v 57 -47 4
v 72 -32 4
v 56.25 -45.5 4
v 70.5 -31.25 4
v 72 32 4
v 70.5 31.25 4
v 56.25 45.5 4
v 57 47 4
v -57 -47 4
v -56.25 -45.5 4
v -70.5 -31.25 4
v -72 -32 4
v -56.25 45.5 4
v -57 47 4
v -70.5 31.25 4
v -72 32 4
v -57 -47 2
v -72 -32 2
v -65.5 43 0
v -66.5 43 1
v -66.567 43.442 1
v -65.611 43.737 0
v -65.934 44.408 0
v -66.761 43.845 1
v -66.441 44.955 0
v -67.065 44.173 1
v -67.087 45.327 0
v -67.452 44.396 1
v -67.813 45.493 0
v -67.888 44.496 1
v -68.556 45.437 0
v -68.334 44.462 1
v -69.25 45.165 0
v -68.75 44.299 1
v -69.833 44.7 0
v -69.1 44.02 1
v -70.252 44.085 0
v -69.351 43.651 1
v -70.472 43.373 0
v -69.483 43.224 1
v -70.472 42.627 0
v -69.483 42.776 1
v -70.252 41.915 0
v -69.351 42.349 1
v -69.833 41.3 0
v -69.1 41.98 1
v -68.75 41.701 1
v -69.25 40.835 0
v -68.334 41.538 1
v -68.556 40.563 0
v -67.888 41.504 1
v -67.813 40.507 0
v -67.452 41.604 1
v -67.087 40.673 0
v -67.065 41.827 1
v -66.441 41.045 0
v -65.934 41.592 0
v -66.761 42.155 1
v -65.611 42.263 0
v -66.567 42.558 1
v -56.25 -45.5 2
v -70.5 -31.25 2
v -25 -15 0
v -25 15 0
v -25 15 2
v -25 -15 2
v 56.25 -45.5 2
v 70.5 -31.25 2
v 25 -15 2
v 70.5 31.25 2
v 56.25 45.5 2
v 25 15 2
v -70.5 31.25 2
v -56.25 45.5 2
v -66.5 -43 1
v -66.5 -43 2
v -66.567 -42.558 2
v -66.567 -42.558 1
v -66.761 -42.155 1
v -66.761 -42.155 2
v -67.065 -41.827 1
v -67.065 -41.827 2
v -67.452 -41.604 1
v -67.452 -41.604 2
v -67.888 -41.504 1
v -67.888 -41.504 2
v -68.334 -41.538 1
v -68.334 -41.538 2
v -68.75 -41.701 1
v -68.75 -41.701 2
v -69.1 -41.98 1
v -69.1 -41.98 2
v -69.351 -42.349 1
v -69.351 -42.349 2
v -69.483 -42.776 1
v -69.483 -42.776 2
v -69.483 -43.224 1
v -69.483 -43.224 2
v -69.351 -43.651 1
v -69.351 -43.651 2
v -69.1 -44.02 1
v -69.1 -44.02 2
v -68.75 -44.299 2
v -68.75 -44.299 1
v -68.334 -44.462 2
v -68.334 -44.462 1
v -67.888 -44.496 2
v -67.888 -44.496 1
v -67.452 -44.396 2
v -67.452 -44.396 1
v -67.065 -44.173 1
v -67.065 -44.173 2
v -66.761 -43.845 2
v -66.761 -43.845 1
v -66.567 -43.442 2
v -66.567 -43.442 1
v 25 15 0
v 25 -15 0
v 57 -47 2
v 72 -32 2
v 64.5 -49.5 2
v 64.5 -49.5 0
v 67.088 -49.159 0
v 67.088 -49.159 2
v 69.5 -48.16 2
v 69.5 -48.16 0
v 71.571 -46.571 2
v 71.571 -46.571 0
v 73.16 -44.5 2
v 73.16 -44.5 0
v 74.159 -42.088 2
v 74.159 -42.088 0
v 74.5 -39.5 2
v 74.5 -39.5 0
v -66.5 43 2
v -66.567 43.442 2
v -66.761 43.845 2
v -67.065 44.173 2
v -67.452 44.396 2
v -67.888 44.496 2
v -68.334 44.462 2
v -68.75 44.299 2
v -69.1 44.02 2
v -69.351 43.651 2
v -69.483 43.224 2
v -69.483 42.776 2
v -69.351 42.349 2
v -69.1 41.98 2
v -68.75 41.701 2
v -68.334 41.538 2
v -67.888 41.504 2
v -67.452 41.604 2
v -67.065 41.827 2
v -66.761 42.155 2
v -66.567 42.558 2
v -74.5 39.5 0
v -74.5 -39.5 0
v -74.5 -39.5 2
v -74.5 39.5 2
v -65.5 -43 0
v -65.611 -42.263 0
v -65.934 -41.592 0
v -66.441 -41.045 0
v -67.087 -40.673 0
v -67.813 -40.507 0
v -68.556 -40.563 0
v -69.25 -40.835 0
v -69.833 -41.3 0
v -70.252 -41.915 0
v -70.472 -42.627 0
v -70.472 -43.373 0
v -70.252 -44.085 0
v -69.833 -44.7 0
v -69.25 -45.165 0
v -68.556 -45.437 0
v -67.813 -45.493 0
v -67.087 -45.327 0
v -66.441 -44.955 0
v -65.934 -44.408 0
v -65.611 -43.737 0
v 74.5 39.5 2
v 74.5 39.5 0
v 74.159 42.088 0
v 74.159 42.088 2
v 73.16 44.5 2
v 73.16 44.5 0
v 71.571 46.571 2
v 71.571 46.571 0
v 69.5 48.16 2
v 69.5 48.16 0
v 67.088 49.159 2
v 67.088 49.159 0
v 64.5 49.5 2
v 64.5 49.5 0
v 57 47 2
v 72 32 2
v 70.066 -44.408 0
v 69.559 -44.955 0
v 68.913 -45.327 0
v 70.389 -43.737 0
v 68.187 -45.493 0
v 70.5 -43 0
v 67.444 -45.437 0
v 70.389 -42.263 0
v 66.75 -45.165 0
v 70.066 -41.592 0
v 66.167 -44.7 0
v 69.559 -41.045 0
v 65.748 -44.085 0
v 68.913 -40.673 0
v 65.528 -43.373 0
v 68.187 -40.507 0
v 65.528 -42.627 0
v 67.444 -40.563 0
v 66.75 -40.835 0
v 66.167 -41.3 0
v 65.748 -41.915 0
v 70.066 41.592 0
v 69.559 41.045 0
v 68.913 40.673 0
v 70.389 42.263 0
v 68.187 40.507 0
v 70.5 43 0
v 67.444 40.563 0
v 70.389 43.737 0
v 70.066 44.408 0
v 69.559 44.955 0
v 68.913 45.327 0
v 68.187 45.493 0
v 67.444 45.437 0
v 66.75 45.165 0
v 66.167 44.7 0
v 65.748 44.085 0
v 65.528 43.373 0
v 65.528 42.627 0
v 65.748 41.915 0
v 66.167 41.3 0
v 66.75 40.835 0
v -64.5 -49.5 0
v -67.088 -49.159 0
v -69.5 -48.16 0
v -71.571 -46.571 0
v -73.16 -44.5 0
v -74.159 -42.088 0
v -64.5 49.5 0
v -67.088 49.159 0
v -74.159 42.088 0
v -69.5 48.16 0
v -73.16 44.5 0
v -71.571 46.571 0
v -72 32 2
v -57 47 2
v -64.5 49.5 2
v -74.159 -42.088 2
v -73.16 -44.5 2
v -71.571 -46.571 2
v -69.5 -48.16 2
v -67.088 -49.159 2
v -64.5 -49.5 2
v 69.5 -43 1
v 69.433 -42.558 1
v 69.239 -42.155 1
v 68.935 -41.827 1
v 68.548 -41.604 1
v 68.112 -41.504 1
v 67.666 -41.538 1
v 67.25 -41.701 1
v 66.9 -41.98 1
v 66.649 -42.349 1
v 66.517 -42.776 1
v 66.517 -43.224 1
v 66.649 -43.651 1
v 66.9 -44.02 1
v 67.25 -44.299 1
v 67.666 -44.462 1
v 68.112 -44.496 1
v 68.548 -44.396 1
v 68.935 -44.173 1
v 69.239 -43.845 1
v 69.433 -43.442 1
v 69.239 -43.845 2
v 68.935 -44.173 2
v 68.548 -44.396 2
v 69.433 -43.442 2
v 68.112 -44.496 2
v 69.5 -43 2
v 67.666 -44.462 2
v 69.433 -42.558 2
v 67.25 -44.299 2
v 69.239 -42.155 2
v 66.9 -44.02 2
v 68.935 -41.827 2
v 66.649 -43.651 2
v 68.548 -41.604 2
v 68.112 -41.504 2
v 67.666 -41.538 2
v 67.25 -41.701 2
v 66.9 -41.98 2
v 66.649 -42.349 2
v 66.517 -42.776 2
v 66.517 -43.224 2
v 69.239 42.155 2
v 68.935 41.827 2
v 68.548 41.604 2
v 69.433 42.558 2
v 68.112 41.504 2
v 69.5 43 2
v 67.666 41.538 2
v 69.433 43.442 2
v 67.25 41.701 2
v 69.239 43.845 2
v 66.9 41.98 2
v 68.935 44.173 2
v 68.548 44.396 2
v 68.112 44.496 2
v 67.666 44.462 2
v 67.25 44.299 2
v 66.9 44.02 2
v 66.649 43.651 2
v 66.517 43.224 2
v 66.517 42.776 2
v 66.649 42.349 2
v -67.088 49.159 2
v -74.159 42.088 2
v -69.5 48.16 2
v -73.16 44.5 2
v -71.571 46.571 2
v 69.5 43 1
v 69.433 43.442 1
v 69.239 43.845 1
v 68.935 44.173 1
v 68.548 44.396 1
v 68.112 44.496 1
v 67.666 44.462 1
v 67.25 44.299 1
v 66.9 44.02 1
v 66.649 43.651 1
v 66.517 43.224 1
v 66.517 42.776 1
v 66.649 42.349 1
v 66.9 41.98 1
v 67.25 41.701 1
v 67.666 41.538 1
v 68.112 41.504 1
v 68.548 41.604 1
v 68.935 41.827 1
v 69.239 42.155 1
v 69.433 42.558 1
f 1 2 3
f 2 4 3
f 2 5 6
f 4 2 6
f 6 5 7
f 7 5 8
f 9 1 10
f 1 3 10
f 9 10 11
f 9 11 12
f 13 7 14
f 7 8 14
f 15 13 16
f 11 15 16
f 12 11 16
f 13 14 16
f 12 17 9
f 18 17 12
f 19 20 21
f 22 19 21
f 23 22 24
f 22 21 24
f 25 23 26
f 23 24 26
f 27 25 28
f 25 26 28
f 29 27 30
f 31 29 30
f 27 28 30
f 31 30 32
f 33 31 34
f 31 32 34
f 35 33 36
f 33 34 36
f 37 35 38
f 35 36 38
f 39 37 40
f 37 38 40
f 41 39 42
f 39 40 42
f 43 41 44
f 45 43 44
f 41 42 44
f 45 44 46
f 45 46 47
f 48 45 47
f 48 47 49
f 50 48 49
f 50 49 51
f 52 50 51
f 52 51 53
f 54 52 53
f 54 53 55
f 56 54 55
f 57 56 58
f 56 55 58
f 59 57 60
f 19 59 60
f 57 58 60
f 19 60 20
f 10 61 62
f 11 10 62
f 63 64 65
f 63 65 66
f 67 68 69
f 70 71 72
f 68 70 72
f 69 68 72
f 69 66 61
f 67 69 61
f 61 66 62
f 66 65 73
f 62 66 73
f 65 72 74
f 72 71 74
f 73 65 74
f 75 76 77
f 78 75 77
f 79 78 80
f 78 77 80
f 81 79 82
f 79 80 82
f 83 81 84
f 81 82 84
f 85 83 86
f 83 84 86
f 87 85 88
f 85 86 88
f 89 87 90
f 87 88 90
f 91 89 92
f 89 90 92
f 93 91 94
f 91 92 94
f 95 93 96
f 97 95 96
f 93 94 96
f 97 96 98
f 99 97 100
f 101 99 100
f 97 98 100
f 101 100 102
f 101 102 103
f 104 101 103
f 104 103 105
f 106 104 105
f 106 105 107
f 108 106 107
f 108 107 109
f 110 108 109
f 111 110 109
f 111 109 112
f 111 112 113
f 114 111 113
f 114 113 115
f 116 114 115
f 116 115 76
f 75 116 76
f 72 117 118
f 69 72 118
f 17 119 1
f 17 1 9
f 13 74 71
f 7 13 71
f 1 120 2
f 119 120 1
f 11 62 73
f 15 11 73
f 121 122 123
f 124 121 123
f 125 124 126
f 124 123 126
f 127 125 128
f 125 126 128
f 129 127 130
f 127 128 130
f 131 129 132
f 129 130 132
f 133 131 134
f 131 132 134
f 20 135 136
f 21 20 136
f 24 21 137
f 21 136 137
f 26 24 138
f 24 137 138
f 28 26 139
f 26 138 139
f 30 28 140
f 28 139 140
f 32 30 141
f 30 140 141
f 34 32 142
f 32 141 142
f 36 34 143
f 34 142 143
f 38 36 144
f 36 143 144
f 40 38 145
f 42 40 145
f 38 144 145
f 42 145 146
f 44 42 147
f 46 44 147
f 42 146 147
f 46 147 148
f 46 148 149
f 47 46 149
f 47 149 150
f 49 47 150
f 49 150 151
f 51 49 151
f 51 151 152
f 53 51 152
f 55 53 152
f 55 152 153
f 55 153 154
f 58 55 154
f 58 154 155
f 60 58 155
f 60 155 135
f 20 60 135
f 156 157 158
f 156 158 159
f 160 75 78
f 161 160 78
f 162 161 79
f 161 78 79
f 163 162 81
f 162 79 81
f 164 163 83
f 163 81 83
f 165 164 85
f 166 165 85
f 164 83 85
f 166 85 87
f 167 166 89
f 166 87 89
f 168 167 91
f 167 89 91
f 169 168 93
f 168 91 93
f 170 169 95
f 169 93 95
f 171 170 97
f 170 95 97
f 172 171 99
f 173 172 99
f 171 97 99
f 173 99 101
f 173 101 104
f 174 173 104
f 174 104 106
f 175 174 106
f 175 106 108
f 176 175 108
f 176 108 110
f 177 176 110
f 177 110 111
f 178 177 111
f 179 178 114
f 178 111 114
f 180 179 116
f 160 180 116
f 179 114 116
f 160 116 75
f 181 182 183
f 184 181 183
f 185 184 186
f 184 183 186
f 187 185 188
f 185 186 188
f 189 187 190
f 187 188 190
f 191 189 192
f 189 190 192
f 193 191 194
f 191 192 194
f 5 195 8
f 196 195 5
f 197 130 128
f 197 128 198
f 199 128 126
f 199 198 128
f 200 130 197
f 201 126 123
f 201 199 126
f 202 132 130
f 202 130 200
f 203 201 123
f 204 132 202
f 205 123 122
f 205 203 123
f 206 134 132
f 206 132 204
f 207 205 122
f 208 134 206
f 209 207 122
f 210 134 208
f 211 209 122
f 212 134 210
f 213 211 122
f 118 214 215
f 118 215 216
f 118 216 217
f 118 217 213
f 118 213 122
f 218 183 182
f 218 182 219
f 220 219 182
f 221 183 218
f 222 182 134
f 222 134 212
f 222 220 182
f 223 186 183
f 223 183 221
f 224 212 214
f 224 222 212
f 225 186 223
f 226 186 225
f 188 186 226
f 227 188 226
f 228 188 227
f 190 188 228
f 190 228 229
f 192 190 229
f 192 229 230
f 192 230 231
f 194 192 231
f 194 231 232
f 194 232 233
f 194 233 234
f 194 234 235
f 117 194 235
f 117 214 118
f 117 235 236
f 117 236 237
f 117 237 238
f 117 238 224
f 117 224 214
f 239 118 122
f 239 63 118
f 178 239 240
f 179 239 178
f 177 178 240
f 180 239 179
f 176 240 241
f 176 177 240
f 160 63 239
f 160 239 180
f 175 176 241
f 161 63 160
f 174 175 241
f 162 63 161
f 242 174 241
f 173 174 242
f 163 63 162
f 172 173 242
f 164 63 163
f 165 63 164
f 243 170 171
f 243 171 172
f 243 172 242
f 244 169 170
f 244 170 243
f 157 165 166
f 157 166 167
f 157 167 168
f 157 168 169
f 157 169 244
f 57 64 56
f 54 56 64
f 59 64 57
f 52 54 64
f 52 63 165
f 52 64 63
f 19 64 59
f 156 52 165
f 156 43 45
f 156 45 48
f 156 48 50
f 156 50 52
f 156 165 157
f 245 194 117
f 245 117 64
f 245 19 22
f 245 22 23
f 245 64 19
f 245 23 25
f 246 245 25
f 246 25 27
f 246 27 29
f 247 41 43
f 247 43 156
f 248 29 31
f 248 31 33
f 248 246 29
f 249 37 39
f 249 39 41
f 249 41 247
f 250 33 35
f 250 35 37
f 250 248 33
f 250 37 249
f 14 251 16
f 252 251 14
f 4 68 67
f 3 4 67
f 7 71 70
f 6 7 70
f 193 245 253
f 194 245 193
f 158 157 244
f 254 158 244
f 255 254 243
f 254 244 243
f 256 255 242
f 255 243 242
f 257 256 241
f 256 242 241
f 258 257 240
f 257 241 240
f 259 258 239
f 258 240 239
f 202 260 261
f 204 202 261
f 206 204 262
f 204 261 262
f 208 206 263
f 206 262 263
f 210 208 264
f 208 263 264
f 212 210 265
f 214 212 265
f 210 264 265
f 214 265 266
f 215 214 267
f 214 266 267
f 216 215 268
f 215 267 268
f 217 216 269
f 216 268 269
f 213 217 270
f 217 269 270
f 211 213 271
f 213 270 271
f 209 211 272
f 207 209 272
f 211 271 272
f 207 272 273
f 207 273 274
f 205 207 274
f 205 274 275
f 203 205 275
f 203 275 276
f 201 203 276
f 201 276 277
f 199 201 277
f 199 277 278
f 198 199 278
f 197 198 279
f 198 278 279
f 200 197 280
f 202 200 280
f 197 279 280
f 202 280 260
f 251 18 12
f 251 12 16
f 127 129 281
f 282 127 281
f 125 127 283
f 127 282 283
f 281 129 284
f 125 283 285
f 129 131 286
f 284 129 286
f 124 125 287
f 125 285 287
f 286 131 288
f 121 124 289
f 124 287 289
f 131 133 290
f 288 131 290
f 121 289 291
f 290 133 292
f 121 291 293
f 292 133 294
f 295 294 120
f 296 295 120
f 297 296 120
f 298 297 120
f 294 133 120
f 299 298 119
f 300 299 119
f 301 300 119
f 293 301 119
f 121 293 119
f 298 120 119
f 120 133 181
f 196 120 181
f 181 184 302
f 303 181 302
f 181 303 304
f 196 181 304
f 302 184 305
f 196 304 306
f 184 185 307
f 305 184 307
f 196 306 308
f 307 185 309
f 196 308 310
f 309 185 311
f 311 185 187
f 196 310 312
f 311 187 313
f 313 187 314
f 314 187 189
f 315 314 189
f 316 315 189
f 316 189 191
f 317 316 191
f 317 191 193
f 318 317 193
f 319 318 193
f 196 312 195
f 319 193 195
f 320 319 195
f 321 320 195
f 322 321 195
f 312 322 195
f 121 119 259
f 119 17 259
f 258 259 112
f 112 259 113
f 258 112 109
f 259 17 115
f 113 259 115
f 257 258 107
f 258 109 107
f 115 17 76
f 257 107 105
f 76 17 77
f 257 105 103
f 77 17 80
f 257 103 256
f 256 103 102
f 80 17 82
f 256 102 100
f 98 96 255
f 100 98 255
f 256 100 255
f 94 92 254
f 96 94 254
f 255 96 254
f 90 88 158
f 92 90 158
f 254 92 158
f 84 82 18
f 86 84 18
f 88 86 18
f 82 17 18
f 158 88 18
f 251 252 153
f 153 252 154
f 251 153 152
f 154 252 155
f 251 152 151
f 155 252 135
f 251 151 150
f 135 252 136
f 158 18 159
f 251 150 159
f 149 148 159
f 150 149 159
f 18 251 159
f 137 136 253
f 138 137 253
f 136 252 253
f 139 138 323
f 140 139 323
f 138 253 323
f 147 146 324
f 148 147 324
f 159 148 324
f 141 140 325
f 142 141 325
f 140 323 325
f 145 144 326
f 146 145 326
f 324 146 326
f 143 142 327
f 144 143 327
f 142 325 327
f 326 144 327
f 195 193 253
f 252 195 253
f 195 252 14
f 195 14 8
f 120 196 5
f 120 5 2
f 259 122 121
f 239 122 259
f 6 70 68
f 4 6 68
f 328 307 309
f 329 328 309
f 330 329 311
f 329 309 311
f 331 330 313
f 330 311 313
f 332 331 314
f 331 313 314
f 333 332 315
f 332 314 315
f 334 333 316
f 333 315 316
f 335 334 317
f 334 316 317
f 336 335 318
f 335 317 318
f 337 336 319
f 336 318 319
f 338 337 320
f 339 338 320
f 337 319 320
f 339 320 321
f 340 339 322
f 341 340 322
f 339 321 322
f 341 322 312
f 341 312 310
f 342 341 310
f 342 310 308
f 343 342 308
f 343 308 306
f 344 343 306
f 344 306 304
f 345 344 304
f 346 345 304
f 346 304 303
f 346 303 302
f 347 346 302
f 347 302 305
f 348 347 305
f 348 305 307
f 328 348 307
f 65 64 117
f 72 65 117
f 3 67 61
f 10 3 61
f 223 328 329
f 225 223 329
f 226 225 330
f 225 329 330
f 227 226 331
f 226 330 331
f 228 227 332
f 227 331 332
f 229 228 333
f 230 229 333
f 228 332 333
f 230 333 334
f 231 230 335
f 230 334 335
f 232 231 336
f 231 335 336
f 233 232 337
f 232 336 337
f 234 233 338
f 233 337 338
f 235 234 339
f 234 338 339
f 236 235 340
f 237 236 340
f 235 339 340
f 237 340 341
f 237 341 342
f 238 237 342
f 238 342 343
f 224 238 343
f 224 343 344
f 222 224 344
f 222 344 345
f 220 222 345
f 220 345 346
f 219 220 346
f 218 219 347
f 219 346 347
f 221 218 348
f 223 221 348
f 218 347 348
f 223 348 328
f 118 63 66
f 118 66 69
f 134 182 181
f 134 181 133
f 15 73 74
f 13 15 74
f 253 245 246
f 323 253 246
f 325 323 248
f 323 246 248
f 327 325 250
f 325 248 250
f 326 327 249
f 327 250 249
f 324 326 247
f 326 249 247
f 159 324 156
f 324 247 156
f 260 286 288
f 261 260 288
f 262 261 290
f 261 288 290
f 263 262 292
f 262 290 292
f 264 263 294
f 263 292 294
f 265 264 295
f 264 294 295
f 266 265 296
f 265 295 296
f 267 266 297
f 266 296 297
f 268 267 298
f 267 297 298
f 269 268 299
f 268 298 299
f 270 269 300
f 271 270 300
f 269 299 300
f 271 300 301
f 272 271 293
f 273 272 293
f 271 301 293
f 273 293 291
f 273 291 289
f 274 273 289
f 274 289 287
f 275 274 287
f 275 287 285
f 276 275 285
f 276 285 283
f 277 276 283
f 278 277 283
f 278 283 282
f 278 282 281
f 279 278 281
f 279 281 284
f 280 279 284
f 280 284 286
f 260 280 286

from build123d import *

# Parameters (mm, degrees)
PAD_DEPTH       = 2
SKETCH002_R     = 1.5
POCKET_DEPTH    = 5
CHAMFER_SIZE    = 1
CHAMFER001_SIZE = 1
CHAMFER002_SIZE = 1
CHAMFER003_SIZE = 1
SKETCH004_W     = 50
SKETCH004_H     = 30
POCKET001_DEPTH = 5
PAD001_DEPTH    = 2


with BuildPart() as part:
    # Sketch → Pad (new body)
    with BuildSketch(Plane.XY):
        with BuildLine():
            Line((-64.5, 49.5), (64.5, 49.5))
            ThreePointArc((74.5, 39.5), (71.571068, 46.571068), (64.5, 49.5))
            Line((74.5, 39.5), (74.5, -39.5))
            ThreePointArc((64.5, -49.5), (71.571068, -46.571068), (74.5, -39.5))
            Line((64.5, -49.5), (-64.5, -49.5))
            ThreePointArc((-74.5, -39.5), (-71.571068, -46.571068), (-64.5, -49.5))
            Line((-74.5, -39.5), (-74.5, 39.5))
            ThreePointArc((-64.5, 49.5), (-71.571068, 46.571068), (-74.5, 39.5))
        make_face()
    extrude(amount=PAD_DEPTH)

    # Sketch002 → Pocket (cut)
    with BuildSketch(Plane.XY.offset(4)):
        with Locations((-68, 43)):
            Circle(SKETCH002_R)
        with Locations((-68, -43)):
            Circle(SKETCH002_R)
        with Locations((68, -43)):
            Circle(SKETCH002_R)
        with Locations((68, 43)):
            Circle(SKETCH002_R)
    extrude(amount=-POCKET_DEPTH, mode=Mode.SUBTRACT)

    # Chamfer
    chamfer_edges = [part.edges().sort_by_distance(p)[0] for p in [
        (-69.5, 43, 0),
    ]]
    chamfer(chamfer_edges, length=CHAMFER_SIZE)

    # Chamfer001
    chamfer001_edges = [part.edges().sort_by_distance(p)[0] for p in [
        (-69.5, -43, 0),
    ]]
    chamfer(chamfer001_edges, length=CHAMFER001_SIZE)

    # Chamfer002
    chamfer002_edges = [part.edges().sort_by_distance(p)[0] for p in [
        (66.5, -43, 0),
    ]]
    chamfer(chamfer002_edges, length=CHAMFER002_SIZE)

    # Chamfer003
    chamfer003_edges = [part.edges().sort_by_distance(p)[0] for p in [
        (66.5, 43, 0),
    ]]
    chamfer(chamfer003_edges, length=CHAMFER003_SIZE)

    # Sketch004 → Pocket001 (cut)
    with BuildSketch(Plane(origin=(0, 0, 0), x_dir=(1, 0, 0), z_dir=(0, 0, -1))):
        Rectangle(SKETCH004_W, SKETCH004_H)
    extrude(amount=-POCKET001_DEPTH, mode=Mode.SUBTRACT)

    # Sketch005 (on Face18 of Pocket001) → Pad001 (join)
    with BuildSketch(Plane.XY.offset(2)):
        Polygon((-57, 47), (57, 47), (72, 32), (72, -32), (57, -47), (-57, -47), (-72, -32), (-72, 32), align=None)
        Polygon((-70.5, 31.25), (-56.25, 45.5), (56.25, 45.5), (70.5, 31.25), (70.5, -31.25), (56.25, -45.5), (-56.25, -45.5), (-70.5, -31.25), align=None, mode=Mode.SUBTRACT)
    extrude(amount=PAD001_DEPTH)


solid = part.part
